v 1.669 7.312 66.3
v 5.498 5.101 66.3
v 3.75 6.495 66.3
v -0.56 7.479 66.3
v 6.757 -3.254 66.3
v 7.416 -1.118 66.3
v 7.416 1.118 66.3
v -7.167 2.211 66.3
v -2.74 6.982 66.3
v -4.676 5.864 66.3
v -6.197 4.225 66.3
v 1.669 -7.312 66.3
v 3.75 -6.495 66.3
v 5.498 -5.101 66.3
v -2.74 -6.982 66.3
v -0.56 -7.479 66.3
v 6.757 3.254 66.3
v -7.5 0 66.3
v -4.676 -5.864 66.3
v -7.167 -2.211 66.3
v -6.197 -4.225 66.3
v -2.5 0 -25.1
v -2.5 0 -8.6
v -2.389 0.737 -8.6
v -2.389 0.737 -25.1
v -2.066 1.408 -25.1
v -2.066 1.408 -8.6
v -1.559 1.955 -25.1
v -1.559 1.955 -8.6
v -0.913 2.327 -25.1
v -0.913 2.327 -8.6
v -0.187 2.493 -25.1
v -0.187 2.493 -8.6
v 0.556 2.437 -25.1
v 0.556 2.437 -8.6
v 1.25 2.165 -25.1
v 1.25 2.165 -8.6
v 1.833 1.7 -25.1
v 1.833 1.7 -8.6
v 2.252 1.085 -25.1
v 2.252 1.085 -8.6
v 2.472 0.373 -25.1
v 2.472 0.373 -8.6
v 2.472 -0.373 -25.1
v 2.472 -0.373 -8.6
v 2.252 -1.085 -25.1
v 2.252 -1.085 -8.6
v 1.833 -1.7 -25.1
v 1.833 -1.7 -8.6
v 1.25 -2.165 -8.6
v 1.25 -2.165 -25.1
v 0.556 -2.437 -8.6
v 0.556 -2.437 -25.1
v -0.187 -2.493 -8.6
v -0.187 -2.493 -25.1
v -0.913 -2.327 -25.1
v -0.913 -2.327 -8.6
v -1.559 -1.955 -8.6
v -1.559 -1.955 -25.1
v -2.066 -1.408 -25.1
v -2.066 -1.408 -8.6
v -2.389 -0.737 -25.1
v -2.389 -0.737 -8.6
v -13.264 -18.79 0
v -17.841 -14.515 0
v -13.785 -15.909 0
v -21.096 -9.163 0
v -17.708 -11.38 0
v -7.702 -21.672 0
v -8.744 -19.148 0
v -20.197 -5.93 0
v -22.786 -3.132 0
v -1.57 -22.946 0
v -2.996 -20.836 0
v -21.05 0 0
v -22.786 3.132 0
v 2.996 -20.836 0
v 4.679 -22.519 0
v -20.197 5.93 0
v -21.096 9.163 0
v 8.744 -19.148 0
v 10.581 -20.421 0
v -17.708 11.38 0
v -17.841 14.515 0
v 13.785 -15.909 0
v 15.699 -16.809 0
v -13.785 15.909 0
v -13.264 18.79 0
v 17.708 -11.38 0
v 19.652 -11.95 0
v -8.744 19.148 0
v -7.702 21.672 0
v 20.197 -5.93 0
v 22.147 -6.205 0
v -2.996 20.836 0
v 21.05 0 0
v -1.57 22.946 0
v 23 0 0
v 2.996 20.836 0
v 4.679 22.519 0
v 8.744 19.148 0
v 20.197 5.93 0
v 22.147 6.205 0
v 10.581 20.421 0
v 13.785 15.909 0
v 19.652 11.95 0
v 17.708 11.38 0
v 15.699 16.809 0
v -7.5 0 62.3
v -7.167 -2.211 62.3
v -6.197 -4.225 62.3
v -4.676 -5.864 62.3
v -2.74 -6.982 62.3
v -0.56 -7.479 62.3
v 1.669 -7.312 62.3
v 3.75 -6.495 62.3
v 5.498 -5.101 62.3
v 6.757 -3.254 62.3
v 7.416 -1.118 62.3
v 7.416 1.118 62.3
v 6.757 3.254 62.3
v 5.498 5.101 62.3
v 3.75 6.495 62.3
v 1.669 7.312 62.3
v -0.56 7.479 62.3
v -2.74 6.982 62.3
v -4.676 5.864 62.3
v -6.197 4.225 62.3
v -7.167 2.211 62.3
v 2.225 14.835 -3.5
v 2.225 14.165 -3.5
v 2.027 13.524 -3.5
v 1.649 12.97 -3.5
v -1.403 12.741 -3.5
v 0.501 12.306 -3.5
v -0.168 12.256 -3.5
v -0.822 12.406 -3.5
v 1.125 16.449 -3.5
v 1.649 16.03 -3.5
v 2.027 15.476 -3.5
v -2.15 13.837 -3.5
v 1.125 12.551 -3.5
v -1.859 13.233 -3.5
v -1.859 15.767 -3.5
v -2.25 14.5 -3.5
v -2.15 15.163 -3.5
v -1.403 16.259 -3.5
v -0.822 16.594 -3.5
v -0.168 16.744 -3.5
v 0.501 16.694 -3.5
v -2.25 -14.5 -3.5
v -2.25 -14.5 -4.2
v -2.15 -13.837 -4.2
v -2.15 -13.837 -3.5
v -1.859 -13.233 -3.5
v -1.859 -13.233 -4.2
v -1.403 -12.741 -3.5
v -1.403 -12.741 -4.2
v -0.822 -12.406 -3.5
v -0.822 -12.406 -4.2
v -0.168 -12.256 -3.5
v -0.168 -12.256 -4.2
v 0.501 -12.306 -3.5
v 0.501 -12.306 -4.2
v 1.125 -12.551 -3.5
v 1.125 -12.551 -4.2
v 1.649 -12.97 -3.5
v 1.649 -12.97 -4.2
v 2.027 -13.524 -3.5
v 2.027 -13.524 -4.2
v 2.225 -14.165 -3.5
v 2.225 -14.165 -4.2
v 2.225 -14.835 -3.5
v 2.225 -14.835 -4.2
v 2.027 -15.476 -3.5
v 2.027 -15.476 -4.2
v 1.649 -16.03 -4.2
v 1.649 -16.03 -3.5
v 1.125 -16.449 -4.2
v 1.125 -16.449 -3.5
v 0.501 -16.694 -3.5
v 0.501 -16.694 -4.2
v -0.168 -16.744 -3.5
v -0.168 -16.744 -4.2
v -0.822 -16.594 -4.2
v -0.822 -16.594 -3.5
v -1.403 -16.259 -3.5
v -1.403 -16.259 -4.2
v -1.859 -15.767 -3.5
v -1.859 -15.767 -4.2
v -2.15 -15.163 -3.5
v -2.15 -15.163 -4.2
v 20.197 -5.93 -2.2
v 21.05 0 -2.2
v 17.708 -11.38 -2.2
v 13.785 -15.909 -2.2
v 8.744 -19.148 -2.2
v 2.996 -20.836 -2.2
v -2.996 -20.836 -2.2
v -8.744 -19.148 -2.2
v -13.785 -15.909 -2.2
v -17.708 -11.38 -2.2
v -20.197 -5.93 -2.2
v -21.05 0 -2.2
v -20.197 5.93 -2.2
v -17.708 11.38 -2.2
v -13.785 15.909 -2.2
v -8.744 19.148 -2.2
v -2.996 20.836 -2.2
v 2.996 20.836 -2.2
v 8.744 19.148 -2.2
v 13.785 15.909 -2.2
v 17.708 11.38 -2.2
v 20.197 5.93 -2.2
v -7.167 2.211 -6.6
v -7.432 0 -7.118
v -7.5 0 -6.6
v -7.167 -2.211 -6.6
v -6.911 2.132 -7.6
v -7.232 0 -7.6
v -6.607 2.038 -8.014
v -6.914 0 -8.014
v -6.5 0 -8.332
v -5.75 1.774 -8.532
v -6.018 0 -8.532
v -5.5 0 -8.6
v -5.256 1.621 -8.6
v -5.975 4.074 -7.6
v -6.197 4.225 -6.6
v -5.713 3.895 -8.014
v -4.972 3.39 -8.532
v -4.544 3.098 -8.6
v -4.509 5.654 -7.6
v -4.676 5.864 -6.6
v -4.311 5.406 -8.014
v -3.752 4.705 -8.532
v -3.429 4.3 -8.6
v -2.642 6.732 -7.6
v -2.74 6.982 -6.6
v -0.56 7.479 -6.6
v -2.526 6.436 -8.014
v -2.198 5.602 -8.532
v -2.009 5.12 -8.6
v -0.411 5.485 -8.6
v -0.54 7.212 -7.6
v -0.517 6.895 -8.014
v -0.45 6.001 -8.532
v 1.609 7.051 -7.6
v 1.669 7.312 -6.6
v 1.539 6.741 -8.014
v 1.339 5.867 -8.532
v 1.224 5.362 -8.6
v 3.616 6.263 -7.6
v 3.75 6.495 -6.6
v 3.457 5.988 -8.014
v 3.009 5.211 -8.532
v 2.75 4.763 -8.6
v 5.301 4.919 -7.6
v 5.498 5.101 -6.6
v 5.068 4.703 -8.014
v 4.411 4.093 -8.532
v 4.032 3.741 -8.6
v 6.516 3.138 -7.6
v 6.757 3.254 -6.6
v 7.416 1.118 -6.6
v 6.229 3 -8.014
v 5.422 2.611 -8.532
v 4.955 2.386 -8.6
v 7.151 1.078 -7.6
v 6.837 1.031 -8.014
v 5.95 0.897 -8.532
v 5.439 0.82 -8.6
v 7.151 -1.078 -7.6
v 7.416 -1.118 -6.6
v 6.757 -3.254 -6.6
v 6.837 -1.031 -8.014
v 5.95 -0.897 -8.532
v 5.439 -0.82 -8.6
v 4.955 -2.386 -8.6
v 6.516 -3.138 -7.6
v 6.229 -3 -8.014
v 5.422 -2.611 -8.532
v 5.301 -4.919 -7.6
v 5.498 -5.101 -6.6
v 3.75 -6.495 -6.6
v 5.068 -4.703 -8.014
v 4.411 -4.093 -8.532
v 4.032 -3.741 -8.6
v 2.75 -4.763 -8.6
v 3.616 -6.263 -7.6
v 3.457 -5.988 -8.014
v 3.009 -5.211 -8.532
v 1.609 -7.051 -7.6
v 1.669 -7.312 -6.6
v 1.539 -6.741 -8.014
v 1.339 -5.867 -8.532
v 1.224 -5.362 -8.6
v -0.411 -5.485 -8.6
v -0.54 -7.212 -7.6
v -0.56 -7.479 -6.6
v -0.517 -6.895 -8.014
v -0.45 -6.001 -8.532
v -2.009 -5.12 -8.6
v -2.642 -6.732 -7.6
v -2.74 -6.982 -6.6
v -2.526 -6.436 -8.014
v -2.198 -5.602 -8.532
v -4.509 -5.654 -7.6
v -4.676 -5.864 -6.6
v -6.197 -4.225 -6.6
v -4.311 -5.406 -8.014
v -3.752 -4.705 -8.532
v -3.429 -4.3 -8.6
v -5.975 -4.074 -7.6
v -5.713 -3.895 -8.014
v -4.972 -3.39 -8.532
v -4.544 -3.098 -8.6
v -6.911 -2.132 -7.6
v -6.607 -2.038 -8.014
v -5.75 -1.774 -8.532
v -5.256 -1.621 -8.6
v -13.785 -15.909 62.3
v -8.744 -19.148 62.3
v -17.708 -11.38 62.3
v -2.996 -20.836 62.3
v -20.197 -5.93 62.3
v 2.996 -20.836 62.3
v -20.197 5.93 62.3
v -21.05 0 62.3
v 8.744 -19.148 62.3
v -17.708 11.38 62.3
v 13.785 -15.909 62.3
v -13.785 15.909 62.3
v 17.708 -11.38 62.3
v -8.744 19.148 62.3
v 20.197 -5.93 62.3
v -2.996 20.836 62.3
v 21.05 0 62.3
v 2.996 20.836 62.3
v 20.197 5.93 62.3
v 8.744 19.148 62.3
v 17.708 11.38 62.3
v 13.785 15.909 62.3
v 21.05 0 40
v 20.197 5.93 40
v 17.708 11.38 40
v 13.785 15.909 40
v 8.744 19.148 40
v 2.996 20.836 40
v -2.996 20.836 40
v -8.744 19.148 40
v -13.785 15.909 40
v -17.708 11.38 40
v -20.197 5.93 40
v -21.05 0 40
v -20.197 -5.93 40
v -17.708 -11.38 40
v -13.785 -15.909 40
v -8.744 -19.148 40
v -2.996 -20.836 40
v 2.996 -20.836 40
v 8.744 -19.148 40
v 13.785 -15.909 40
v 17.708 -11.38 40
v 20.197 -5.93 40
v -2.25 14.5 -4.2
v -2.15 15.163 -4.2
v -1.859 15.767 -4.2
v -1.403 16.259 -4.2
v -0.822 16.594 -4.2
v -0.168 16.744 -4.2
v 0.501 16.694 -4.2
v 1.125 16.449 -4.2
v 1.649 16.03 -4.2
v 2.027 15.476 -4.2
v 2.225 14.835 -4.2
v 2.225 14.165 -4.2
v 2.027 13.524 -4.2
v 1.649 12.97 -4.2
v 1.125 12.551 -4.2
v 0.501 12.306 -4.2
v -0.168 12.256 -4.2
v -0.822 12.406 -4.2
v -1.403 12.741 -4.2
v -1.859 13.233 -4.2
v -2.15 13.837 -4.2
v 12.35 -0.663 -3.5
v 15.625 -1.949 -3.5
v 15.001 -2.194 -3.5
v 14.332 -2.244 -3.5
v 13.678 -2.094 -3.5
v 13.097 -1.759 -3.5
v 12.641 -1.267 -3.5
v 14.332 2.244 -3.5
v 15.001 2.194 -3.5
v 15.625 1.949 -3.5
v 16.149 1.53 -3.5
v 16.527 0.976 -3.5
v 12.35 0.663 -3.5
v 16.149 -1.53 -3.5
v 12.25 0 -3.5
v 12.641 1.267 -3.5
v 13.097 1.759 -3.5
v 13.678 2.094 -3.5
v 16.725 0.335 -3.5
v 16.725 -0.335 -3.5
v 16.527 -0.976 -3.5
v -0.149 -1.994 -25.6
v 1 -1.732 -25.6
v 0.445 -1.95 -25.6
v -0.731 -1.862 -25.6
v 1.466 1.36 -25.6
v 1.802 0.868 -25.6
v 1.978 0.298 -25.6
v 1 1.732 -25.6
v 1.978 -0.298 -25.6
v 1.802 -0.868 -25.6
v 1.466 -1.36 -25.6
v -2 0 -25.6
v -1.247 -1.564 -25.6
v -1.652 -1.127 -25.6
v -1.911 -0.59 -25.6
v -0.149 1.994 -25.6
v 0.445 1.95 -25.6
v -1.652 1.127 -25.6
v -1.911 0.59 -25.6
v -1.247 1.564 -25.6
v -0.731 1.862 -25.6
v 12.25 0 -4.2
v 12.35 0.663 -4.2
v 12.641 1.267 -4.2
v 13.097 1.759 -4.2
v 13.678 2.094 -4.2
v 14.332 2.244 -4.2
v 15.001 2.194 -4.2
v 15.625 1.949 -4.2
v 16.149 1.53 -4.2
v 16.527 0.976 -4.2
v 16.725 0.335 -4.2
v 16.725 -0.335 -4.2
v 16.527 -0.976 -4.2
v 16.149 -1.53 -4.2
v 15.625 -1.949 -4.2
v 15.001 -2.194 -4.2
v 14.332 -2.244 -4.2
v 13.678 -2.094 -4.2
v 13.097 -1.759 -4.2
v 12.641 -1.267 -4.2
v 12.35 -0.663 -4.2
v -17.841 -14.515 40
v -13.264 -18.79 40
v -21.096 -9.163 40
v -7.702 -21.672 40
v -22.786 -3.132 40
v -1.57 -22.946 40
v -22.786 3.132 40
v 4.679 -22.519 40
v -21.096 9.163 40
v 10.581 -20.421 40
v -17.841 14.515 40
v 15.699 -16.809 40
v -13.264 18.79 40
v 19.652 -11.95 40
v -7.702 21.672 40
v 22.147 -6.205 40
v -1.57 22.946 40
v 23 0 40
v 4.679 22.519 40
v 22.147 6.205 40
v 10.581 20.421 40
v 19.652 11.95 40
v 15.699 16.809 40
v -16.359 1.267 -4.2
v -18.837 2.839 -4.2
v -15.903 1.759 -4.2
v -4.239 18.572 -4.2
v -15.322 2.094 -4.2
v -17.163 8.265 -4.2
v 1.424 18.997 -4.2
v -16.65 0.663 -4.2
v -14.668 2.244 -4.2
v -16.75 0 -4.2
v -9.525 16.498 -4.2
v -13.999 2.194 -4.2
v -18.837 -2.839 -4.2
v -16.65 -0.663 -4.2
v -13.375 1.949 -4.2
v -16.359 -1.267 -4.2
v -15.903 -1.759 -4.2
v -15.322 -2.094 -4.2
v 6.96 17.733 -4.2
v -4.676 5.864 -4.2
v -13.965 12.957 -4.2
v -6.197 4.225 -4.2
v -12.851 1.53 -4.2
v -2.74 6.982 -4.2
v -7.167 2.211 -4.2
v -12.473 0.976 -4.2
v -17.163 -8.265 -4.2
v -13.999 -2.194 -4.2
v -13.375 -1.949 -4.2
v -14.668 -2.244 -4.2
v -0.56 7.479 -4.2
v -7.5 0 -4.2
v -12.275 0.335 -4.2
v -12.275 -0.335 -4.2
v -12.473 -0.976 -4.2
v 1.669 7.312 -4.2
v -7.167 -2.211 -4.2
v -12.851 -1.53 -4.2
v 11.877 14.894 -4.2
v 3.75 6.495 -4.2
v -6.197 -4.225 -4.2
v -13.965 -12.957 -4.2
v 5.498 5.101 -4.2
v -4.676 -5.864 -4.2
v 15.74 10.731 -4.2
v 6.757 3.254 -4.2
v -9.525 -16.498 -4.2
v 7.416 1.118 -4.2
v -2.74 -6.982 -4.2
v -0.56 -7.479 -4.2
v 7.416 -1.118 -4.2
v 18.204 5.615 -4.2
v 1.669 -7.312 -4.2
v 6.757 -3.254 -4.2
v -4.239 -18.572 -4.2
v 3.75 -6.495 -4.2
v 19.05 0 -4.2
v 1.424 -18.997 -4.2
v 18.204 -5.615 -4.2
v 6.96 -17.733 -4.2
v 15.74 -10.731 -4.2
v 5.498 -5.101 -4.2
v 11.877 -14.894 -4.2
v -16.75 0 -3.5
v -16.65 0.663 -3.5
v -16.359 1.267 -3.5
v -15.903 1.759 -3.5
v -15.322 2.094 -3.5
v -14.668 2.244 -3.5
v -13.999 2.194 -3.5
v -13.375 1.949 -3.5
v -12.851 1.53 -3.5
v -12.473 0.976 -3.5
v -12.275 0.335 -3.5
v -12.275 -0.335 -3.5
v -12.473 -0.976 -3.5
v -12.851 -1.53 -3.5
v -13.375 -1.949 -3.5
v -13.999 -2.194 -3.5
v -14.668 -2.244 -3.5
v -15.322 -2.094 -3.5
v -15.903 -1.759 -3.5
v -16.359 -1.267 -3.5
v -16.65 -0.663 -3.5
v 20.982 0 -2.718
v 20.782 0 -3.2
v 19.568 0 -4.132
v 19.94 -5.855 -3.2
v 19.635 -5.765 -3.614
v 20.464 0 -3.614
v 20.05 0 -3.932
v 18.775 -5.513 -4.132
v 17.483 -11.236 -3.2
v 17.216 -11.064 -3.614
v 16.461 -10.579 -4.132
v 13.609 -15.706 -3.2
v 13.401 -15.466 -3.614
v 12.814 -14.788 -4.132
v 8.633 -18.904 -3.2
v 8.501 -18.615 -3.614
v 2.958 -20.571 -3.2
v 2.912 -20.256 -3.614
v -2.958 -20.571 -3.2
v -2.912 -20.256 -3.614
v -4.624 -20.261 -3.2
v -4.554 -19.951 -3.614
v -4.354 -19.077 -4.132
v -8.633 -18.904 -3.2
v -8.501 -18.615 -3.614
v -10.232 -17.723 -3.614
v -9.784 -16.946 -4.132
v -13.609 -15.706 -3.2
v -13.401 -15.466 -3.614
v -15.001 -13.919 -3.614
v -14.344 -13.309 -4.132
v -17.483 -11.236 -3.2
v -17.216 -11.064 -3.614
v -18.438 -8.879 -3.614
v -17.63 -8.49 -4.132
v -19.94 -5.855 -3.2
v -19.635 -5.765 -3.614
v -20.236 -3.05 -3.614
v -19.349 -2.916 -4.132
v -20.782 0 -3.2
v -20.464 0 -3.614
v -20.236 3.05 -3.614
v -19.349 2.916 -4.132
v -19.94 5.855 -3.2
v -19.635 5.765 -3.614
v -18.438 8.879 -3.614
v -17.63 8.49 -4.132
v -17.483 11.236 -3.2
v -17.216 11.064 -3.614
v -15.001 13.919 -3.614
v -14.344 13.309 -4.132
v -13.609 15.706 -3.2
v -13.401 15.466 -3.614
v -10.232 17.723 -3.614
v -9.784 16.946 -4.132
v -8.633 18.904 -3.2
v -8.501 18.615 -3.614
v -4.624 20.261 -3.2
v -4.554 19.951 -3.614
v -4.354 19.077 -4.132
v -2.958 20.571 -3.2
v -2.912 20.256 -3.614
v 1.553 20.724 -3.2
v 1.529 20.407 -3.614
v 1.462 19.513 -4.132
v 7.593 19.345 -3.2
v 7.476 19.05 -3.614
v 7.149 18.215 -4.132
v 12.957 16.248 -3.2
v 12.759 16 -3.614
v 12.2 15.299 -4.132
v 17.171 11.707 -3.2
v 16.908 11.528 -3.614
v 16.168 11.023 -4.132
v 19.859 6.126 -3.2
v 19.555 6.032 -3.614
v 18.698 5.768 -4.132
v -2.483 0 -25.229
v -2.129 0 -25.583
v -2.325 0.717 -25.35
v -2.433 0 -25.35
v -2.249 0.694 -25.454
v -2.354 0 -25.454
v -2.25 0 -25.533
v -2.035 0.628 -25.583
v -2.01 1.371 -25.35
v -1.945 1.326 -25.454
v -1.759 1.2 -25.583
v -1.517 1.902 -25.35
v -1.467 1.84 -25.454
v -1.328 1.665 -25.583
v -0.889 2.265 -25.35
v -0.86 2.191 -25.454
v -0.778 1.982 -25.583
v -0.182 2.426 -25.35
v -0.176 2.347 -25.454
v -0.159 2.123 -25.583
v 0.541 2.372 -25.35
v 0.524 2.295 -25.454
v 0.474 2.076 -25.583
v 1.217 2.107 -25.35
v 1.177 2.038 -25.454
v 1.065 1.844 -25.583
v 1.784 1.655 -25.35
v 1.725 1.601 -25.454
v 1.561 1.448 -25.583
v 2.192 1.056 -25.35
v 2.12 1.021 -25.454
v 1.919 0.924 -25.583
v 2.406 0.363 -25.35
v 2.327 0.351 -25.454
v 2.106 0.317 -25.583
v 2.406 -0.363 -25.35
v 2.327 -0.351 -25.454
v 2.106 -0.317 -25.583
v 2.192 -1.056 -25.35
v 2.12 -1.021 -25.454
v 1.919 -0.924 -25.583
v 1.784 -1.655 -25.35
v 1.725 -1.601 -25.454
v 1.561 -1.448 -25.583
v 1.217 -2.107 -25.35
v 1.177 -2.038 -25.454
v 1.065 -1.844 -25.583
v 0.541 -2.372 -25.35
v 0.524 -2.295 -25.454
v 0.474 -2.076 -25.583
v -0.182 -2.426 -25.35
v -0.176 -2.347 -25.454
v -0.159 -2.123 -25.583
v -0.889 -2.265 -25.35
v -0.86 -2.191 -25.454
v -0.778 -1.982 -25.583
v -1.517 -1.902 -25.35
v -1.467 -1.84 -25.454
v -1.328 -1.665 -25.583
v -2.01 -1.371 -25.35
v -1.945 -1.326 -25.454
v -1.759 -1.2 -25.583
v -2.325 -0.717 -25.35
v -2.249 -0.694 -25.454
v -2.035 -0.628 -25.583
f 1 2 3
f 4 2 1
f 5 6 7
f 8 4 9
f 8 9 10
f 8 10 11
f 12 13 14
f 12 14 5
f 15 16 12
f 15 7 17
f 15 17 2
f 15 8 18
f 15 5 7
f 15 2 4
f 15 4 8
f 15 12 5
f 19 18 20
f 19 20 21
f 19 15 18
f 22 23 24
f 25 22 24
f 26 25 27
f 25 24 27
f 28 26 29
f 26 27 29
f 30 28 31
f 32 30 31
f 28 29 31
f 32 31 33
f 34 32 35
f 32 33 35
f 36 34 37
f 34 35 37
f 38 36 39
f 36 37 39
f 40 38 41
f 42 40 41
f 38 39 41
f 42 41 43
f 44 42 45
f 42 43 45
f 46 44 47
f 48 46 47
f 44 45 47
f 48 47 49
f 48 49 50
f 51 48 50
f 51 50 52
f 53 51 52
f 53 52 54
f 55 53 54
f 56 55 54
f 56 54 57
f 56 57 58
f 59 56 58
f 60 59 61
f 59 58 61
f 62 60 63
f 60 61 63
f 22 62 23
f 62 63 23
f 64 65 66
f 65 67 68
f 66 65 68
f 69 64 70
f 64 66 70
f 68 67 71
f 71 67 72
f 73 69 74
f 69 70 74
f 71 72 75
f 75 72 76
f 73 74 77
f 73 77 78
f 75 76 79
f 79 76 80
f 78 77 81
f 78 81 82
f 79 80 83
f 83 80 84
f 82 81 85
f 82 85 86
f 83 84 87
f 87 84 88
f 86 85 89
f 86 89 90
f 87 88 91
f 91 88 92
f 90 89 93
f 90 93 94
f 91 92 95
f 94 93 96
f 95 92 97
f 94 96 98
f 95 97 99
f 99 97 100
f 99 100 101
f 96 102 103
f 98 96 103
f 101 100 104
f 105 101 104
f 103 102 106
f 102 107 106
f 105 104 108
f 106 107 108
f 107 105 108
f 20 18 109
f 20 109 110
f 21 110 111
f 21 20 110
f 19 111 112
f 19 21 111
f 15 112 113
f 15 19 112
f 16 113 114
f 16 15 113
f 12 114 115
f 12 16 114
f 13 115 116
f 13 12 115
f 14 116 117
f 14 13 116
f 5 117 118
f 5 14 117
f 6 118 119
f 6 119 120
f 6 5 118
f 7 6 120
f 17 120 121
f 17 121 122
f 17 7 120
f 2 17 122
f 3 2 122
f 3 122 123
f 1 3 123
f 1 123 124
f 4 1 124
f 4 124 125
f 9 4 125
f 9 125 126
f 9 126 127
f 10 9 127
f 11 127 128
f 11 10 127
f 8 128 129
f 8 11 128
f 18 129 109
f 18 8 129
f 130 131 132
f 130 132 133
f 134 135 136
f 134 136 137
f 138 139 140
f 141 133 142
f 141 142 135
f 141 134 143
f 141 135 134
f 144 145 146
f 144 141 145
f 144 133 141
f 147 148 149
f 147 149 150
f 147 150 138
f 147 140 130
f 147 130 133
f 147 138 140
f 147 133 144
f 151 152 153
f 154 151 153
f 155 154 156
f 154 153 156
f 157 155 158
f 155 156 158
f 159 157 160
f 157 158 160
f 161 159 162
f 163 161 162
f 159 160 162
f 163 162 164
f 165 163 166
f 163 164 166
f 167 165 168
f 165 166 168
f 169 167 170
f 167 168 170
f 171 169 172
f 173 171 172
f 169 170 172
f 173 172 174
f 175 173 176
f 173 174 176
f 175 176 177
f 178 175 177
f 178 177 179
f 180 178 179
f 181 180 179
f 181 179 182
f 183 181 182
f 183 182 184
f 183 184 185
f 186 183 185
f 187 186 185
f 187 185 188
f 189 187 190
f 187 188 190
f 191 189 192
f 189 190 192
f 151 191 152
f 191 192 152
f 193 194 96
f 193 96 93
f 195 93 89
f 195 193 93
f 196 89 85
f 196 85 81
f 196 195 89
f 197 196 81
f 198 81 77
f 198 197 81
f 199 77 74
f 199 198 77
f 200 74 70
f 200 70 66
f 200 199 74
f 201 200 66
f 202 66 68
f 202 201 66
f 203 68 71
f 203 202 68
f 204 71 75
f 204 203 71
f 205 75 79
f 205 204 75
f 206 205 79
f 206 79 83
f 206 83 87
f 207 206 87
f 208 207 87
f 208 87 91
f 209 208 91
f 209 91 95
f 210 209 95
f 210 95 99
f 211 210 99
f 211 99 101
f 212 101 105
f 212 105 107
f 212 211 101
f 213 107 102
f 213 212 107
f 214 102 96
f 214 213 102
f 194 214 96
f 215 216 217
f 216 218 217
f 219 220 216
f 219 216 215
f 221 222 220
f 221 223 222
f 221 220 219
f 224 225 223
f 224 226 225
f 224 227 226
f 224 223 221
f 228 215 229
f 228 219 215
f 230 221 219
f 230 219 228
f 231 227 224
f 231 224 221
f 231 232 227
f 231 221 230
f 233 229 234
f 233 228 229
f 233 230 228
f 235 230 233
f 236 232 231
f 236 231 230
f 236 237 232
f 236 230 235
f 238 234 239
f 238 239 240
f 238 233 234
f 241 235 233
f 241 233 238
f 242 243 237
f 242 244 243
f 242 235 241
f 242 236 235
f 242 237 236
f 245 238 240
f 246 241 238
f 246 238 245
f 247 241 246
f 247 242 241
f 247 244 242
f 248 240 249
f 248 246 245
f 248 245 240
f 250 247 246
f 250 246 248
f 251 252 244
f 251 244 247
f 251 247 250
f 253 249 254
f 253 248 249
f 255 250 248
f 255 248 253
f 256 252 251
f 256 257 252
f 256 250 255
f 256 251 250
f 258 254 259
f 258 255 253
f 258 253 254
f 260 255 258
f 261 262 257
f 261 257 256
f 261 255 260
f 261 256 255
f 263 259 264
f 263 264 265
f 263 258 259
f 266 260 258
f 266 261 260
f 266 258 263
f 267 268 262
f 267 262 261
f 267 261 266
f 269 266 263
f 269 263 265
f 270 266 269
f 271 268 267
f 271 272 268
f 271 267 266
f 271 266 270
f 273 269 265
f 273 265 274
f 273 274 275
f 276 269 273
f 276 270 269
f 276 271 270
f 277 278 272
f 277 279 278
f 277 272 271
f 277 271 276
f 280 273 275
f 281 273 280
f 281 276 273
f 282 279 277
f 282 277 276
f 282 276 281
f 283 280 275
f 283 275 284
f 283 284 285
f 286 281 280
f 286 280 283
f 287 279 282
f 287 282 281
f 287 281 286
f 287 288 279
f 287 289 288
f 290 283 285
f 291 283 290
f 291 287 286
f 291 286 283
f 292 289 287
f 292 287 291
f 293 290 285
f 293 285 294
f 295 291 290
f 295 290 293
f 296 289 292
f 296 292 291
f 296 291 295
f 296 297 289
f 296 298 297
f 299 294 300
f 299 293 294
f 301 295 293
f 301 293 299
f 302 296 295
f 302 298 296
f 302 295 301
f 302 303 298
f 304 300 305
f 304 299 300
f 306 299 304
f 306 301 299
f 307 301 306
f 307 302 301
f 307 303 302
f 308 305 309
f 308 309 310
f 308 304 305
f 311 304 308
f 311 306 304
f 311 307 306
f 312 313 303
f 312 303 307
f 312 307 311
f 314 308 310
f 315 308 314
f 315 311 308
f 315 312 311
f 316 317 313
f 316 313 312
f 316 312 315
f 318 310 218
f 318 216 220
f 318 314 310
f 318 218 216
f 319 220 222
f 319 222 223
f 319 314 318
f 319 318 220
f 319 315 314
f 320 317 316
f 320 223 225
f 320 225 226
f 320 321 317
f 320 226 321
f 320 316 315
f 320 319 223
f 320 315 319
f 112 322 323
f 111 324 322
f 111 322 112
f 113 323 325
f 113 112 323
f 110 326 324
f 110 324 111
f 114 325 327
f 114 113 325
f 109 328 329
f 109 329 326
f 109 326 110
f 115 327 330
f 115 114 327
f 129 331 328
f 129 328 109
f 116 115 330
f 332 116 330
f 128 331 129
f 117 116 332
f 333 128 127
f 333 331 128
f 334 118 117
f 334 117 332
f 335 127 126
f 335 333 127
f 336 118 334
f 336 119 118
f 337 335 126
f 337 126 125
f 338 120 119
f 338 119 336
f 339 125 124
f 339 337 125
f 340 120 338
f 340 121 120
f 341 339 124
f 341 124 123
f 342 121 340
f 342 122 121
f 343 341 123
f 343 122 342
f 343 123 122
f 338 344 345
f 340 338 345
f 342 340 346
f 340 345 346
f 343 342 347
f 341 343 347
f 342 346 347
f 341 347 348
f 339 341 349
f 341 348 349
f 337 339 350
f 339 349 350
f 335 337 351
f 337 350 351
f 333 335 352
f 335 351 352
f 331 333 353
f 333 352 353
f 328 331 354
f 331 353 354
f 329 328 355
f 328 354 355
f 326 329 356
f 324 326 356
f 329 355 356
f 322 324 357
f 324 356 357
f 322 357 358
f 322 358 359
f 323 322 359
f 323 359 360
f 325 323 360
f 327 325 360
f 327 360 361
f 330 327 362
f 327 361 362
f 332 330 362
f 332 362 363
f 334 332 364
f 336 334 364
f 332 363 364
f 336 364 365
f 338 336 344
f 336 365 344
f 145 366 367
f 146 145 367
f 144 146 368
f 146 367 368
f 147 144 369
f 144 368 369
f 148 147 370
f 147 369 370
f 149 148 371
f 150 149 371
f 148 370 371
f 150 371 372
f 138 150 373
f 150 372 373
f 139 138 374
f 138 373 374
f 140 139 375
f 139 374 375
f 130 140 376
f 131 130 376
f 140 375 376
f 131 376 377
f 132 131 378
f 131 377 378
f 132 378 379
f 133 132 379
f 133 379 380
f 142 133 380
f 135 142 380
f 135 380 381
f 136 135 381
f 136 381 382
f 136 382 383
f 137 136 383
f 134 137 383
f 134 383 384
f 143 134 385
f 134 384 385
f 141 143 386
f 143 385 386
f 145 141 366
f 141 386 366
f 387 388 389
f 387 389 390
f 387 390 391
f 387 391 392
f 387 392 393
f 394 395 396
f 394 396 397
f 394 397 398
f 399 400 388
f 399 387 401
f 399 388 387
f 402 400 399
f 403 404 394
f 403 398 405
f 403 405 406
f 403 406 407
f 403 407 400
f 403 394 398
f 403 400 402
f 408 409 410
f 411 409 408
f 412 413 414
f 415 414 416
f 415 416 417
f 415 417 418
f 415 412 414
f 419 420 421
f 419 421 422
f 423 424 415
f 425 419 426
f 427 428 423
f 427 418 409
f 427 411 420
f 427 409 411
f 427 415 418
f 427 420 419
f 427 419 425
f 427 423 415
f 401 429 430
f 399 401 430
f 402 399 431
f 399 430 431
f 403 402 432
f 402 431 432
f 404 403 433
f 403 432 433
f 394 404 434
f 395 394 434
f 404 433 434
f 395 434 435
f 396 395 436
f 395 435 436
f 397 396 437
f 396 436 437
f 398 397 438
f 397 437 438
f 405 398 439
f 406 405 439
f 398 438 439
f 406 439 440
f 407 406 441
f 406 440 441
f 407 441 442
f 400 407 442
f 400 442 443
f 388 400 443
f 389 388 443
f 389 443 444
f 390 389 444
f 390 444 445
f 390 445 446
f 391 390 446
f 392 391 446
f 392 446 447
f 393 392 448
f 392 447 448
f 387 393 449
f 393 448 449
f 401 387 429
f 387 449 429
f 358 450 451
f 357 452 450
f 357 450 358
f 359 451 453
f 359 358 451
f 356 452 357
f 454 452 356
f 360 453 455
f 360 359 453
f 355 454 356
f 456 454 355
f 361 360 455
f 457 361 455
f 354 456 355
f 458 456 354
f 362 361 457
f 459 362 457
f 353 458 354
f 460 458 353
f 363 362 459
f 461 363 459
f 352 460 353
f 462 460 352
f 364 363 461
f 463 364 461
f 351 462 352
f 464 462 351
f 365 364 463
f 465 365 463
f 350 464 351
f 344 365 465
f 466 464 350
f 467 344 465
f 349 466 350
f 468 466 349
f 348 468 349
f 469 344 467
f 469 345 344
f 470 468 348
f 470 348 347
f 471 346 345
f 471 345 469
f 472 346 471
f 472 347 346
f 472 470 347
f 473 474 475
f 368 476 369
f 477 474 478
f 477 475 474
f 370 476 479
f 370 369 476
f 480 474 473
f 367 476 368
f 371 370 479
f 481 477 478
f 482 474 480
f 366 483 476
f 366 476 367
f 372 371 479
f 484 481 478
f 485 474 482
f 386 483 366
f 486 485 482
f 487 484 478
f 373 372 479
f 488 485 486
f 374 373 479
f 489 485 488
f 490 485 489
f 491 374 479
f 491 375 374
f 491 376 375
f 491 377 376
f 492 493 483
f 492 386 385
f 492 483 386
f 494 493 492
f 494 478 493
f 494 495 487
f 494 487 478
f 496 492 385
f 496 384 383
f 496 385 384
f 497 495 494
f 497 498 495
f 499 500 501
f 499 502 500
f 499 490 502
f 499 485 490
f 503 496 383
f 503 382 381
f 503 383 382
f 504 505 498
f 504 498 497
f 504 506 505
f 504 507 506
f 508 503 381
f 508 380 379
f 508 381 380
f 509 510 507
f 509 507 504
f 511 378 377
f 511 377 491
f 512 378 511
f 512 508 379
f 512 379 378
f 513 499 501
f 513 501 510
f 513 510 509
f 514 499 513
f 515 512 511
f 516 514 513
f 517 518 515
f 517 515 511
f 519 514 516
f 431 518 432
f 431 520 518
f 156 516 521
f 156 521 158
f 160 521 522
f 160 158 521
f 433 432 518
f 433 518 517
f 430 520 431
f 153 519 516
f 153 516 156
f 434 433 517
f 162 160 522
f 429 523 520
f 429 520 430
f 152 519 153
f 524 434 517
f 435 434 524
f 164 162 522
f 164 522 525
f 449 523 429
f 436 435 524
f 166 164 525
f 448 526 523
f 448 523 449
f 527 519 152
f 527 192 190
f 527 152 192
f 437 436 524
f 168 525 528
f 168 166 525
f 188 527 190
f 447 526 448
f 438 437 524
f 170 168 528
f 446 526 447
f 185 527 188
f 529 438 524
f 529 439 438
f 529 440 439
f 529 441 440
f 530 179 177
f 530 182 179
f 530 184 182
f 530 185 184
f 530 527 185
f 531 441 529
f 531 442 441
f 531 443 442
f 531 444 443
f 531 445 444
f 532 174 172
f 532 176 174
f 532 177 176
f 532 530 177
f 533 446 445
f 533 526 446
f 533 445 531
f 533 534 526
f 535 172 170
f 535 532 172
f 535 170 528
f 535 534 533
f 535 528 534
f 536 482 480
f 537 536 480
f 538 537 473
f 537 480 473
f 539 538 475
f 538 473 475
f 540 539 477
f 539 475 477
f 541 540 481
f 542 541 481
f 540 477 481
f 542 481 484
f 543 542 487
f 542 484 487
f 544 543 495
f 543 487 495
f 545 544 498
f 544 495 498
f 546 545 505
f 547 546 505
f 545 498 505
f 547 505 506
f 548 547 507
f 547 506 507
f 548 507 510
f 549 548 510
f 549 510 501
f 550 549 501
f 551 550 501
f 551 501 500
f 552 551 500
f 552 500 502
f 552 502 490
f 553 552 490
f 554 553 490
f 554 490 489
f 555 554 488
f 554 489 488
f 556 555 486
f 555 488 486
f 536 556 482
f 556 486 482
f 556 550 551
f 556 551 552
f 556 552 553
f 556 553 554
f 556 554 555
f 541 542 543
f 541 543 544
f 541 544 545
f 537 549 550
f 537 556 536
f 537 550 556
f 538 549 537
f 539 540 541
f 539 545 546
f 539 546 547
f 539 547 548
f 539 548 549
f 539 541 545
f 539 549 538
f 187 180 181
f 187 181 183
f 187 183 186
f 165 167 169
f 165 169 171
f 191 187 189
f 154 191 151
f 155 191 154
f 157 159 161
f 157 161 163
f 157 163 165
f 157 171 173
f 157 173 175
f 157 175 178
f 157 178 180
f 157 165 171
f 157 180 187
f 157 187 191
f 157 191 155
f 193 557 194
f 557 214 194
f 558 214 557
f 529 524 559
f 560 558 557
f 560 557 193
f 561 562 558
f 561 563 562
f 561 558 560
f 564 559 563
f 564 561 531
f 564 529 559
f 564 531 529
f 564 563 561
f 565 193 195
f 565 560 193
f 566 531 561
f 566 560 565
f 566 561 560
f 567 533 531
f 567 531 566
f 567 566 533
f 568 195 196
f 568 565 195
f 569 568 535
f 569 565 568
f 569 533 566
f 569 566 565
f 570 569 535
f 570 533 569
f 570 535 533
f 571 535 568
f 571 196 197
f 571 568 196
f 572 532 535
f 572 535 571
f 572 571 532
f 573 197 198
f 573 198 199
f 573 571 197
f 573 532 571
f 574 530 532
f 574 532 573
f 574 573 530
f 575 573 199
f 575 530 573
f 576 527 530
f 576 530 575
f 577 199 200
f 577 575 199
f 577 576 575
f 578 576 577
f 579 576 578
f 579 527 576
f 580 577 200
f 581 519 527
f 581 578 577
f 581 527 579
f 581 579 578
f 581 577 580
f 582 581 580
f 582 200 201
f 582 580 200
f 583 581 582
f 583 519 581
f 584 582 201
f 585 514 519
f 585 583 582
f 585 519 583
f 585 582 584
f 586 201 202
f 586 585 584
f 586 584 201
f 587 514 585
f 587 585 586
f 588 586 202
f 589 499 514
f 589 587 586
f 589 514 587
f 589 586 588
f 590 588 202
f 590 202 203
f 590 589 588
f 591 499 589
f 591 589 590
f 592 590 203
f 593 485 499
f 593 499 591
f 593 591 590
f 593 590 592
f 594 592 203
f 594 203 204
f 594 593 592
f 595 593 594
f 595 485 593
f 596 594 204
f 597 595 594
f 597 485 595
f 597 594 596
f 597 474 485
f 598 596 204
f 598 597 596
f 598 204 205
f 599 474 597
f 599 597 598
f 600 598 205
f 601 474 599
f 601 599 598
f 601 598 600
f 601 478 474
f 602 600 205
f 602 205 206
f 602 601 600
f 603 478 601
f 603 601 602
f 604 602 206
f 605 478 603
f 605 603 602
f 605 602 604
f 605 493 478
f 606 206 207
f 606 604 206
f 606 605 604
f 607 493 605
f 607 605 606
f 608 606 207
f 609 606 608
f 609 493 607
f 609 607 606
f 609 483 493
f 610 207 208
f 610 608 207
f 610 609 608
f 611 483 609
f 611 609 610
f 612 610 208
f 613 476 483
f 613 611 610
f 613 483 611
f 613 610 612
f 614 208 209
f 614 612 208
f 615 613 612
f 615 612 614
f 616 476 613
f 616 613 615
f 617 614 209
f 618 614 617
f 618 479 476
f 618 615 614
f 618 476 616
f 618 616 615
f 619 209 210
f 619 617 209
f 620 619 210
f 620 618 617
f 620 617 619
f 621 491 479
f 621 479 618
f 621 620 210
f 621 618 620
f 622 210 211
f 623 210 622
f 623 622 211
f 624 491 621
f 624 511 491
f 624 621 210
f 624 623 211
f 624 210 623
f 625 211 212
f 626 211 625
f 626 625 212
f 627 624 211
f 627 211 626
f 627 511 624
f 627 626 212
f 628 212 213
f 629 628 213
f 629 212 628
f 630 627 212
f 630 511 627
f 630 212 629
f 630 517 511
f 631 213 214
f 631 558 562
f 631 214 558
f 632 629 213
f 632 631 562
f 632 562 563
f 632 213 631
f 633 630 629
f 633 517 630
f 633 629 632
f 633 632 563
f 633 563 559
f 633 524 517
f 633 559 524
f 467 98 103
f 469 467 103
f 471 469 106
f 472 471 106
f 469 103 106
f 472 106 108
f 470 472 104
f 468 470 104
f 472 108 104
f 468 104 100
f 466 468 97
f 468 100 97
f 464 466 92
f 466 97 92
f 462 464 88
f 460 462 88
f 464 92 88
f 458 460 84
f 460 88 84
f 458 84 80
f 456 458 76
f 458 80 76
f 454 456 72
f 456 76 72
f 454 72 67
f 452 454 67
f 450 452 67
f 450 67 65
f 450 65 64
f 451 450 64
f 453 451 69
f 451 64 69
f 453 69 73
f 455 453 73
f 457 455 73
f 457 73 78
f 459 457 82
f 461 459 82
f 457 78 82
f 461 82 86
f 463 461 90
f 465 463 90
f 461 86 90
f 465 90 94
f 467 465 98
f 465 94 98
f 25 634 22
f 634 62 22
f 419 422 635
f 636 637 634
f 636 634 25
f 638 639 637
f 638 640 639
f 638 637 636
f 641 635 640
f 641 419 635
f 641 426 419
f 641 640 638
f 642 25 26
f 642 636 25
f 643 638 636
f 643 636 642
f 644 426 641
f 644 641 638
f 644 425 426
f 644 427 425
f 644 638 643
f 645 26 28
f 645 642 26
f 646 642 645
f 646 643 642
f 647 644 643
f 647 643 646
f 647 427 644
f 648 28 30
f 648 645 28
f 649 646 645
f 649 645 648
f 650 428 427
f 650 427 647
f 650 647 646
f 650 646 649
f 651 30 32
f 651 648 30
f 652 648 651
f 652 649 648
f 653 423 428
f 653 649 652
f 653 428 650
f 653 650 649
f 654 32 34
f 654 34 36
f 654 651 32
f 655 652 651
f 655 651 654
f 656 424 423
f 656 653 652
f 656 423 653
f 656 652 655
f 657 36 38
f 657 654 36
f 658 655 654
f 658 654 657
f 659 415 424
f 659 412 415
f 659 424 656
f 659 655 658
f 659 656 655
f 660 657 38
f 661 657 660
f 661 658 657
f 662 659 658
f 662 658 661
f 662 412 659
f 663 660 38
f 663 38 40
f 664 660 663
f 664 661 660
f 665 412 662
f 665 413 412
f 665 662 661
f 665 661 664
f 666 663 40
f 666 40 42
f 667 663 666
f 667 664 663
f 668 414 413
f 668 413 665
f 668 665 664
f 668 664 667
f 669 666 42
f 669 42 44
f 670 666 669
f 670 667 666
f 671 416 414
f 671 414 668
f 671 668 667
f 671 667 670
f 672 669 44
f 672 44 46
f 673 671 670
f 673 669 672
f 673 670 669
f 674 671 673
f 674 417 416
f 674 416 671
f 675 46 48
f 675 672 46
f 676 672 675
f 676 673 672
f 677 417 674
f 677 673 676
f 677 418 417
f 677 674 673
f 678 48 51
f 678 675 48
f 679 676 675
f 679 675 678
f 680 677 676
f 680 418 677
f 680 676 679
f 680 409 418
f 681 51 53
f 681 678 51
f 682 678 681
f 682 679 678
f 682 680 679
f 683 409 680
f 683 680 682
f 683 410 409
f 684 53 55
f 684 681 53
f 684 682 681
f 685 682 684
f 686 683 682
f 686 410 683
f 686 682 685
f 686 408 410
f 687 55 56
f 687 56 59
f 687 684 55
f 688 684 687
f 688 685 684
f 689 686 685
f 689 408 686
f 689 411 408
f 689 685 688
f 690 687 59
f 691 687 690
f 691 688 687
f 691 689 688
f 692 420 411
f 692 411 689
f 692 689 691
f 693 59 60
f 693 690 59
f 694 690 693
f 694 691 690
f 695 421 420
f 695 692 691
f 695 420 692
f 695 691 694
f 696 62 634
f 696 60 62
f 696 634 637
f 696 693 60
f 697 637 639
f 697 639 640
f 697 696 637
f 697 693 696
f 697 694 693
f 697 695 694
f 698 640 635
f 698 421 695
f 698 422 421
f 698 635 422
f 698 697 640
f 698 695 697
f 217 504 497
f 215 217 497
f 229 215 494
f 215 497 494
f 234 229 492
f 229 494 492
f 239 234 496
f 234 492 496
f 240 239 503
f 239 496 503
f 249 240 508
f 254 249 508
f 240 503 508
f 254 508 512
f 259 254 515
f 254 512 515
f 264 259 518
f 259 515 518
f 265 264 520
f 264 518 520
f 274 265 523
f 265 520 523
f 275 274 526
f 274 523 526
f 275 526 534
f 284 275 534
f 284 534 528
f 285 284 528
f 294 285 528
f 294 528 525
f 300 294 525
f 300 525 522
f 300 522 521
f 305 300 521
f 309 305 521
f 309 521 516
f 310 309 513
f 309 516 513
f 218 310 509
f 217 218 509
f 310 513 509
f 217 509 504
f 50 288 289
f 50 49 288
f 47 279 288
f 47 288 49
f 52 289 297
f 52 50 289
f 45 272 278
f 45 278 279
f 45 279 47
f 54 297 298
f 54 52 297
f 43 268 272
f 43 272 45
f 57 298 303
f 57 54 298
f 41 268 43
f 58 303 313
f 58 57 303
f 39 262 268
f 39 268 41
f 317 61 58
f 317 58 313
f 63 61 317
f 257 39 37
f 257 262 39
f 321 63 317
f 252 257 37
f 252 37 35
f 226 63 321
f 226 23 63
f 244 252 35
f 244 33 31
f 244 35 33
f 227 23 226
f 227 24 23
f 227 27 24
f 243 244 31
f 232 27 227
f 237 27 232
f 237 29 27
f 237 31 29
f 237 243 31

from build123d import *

# Parameters (mm, degrees)
SKETCH1_R           = 23
BOSS_EXTRUDE1_DEPTH = 40
SKETCH2_R           = 21.05
BOSS_EXTRUDE2_DEPTH = 22.3
BOSS_EXTRUDE3_START = 4.2
SKETCH3_R           = 21.05
BOSS_EXTRUDE3_DEPTH = 4.2
FILLET1_R           = 2
SKETCH4_R           = 7.5
BOSS_EXTRUDE4_DEPTH = 4.4
FILLET2_R           = 2
SKETCH5_R           = 2.5
BOSS_EXTRUDE5_DEPTH = 17
FILLET3_R           = 0.5
BOSS_EXTRUDE6_START = 4
SKETCH6_R           = 7.5
BOSS_EXTRUDE6_DEPTH = 4
SKETCH7_R           = 2.25
CUT_EXTRUDE1_DEPTH  = 0.7


with BuildPart() as part:
    # Sketch1 → Boss-Extrude1 (new body)
    with BuildSketch(Plane.XY):
        Circle(SKETCH1_R)
    extrude(amount=BOSS_EXTRUDE1_DEPTH)

    # Sketch2 → Boss-Extrude2 (add)
    with BuildSketch(Plane.XY.offset(40)):
        Circle(SKETCH2_R)
    extrude(amount=BOSS_EXTRUDE2_DEPTH)

    # Sketch3 → Boss-Extrude3 (add)
    with BuildSketch(Plane(origin=(0, 0, 0), x_dir=(-1, 0, 0), z_dir=(0, 0, -1)).offset(BOSS_EXTRUDE3_START)):
        with Locations(Location((0, 0, 0), (0, 0, 180))):
            Circle(SKETCH3_R)
    extrude(amount=-BOSS_EXTRUDE3_DEPTH)

    # Fillet1
    fillet1_edges = [part.edges().sort_by_distance(p)[0] for p in [
        (-21.05, 0, -4.2),
    ]]
    fillet(fillet1_edges, radius=FILLET1_R)

    # Sketch4 → Boss-Extrude4 (add)
    with BuildSketch(Plane(origin=(0, 0, -4.2), x_dir=(-1, 0, 0), z_dir=(0, 0, -1))):
        Circle(SKETCH4_R)
    extrude(amount=BOSS_EXTRUDE4_DEPTH)

    # Fillet2
    fillet2_edges = [part.edges().sort_by_distance(p)[0] for p in [
        (7.5, 0, -8.6),
    ]]
    fillet(fillet2_edges, radius=FILLET2_R)

    # Sketch5 → Boss-Extrude5 (add)
    with BuildSketch(Plane(origin=(0, 0, -8.6), x_dir=(-1, 0, 0), z_dir=(0, 0, -1))):
        Circle(SKETCH5_R)
    extrude(amount=BOSS_EXTRUDE5_DEPTH)

    # Fillet3
    fillet3_edges = [part.edges().sort_by_distance(p)[0] for p in [
        (2.5, 0, -25.6),
    ]]
    fillet(fillet3_edges, radius=FILLET3_R)

    # Sketch6 → Boss-Extrude6 (add)
    with BuildSketch(Plane.XY.offset(62.3).offset(BOSS_EXTRUDE6_START)):
        with Locations(Location((0, 0, 0), (0, 0, 180))):
            Circle(SKETCH6_R)
    extrude(amount=-BOSS_EXTRUDE6_DEPTH)

    # Sketch7 → Cut-Extrude1 (cut)
    with BuildSketch(Plane(origin=(0, 0, -4.2), x_dir=(-1, 0, 0), z_dir=(0, 0, -1))):
        with Locations((0, 14.5)):
            Circle(SKETCH7_R)
        with Locations((14.5, 0)):
            Circle(SKETCH7_R)
        with Locations((0, -14.5)):
            Circle(SKETCH7_R)
        with Locations((-14.5, 0)):
            Circle(SKETCH7_R)
    extrude(amount=-CUT_EXTRUDE1_DEPTH, mode=Mode.SUBTRACT)


solid = part.part
